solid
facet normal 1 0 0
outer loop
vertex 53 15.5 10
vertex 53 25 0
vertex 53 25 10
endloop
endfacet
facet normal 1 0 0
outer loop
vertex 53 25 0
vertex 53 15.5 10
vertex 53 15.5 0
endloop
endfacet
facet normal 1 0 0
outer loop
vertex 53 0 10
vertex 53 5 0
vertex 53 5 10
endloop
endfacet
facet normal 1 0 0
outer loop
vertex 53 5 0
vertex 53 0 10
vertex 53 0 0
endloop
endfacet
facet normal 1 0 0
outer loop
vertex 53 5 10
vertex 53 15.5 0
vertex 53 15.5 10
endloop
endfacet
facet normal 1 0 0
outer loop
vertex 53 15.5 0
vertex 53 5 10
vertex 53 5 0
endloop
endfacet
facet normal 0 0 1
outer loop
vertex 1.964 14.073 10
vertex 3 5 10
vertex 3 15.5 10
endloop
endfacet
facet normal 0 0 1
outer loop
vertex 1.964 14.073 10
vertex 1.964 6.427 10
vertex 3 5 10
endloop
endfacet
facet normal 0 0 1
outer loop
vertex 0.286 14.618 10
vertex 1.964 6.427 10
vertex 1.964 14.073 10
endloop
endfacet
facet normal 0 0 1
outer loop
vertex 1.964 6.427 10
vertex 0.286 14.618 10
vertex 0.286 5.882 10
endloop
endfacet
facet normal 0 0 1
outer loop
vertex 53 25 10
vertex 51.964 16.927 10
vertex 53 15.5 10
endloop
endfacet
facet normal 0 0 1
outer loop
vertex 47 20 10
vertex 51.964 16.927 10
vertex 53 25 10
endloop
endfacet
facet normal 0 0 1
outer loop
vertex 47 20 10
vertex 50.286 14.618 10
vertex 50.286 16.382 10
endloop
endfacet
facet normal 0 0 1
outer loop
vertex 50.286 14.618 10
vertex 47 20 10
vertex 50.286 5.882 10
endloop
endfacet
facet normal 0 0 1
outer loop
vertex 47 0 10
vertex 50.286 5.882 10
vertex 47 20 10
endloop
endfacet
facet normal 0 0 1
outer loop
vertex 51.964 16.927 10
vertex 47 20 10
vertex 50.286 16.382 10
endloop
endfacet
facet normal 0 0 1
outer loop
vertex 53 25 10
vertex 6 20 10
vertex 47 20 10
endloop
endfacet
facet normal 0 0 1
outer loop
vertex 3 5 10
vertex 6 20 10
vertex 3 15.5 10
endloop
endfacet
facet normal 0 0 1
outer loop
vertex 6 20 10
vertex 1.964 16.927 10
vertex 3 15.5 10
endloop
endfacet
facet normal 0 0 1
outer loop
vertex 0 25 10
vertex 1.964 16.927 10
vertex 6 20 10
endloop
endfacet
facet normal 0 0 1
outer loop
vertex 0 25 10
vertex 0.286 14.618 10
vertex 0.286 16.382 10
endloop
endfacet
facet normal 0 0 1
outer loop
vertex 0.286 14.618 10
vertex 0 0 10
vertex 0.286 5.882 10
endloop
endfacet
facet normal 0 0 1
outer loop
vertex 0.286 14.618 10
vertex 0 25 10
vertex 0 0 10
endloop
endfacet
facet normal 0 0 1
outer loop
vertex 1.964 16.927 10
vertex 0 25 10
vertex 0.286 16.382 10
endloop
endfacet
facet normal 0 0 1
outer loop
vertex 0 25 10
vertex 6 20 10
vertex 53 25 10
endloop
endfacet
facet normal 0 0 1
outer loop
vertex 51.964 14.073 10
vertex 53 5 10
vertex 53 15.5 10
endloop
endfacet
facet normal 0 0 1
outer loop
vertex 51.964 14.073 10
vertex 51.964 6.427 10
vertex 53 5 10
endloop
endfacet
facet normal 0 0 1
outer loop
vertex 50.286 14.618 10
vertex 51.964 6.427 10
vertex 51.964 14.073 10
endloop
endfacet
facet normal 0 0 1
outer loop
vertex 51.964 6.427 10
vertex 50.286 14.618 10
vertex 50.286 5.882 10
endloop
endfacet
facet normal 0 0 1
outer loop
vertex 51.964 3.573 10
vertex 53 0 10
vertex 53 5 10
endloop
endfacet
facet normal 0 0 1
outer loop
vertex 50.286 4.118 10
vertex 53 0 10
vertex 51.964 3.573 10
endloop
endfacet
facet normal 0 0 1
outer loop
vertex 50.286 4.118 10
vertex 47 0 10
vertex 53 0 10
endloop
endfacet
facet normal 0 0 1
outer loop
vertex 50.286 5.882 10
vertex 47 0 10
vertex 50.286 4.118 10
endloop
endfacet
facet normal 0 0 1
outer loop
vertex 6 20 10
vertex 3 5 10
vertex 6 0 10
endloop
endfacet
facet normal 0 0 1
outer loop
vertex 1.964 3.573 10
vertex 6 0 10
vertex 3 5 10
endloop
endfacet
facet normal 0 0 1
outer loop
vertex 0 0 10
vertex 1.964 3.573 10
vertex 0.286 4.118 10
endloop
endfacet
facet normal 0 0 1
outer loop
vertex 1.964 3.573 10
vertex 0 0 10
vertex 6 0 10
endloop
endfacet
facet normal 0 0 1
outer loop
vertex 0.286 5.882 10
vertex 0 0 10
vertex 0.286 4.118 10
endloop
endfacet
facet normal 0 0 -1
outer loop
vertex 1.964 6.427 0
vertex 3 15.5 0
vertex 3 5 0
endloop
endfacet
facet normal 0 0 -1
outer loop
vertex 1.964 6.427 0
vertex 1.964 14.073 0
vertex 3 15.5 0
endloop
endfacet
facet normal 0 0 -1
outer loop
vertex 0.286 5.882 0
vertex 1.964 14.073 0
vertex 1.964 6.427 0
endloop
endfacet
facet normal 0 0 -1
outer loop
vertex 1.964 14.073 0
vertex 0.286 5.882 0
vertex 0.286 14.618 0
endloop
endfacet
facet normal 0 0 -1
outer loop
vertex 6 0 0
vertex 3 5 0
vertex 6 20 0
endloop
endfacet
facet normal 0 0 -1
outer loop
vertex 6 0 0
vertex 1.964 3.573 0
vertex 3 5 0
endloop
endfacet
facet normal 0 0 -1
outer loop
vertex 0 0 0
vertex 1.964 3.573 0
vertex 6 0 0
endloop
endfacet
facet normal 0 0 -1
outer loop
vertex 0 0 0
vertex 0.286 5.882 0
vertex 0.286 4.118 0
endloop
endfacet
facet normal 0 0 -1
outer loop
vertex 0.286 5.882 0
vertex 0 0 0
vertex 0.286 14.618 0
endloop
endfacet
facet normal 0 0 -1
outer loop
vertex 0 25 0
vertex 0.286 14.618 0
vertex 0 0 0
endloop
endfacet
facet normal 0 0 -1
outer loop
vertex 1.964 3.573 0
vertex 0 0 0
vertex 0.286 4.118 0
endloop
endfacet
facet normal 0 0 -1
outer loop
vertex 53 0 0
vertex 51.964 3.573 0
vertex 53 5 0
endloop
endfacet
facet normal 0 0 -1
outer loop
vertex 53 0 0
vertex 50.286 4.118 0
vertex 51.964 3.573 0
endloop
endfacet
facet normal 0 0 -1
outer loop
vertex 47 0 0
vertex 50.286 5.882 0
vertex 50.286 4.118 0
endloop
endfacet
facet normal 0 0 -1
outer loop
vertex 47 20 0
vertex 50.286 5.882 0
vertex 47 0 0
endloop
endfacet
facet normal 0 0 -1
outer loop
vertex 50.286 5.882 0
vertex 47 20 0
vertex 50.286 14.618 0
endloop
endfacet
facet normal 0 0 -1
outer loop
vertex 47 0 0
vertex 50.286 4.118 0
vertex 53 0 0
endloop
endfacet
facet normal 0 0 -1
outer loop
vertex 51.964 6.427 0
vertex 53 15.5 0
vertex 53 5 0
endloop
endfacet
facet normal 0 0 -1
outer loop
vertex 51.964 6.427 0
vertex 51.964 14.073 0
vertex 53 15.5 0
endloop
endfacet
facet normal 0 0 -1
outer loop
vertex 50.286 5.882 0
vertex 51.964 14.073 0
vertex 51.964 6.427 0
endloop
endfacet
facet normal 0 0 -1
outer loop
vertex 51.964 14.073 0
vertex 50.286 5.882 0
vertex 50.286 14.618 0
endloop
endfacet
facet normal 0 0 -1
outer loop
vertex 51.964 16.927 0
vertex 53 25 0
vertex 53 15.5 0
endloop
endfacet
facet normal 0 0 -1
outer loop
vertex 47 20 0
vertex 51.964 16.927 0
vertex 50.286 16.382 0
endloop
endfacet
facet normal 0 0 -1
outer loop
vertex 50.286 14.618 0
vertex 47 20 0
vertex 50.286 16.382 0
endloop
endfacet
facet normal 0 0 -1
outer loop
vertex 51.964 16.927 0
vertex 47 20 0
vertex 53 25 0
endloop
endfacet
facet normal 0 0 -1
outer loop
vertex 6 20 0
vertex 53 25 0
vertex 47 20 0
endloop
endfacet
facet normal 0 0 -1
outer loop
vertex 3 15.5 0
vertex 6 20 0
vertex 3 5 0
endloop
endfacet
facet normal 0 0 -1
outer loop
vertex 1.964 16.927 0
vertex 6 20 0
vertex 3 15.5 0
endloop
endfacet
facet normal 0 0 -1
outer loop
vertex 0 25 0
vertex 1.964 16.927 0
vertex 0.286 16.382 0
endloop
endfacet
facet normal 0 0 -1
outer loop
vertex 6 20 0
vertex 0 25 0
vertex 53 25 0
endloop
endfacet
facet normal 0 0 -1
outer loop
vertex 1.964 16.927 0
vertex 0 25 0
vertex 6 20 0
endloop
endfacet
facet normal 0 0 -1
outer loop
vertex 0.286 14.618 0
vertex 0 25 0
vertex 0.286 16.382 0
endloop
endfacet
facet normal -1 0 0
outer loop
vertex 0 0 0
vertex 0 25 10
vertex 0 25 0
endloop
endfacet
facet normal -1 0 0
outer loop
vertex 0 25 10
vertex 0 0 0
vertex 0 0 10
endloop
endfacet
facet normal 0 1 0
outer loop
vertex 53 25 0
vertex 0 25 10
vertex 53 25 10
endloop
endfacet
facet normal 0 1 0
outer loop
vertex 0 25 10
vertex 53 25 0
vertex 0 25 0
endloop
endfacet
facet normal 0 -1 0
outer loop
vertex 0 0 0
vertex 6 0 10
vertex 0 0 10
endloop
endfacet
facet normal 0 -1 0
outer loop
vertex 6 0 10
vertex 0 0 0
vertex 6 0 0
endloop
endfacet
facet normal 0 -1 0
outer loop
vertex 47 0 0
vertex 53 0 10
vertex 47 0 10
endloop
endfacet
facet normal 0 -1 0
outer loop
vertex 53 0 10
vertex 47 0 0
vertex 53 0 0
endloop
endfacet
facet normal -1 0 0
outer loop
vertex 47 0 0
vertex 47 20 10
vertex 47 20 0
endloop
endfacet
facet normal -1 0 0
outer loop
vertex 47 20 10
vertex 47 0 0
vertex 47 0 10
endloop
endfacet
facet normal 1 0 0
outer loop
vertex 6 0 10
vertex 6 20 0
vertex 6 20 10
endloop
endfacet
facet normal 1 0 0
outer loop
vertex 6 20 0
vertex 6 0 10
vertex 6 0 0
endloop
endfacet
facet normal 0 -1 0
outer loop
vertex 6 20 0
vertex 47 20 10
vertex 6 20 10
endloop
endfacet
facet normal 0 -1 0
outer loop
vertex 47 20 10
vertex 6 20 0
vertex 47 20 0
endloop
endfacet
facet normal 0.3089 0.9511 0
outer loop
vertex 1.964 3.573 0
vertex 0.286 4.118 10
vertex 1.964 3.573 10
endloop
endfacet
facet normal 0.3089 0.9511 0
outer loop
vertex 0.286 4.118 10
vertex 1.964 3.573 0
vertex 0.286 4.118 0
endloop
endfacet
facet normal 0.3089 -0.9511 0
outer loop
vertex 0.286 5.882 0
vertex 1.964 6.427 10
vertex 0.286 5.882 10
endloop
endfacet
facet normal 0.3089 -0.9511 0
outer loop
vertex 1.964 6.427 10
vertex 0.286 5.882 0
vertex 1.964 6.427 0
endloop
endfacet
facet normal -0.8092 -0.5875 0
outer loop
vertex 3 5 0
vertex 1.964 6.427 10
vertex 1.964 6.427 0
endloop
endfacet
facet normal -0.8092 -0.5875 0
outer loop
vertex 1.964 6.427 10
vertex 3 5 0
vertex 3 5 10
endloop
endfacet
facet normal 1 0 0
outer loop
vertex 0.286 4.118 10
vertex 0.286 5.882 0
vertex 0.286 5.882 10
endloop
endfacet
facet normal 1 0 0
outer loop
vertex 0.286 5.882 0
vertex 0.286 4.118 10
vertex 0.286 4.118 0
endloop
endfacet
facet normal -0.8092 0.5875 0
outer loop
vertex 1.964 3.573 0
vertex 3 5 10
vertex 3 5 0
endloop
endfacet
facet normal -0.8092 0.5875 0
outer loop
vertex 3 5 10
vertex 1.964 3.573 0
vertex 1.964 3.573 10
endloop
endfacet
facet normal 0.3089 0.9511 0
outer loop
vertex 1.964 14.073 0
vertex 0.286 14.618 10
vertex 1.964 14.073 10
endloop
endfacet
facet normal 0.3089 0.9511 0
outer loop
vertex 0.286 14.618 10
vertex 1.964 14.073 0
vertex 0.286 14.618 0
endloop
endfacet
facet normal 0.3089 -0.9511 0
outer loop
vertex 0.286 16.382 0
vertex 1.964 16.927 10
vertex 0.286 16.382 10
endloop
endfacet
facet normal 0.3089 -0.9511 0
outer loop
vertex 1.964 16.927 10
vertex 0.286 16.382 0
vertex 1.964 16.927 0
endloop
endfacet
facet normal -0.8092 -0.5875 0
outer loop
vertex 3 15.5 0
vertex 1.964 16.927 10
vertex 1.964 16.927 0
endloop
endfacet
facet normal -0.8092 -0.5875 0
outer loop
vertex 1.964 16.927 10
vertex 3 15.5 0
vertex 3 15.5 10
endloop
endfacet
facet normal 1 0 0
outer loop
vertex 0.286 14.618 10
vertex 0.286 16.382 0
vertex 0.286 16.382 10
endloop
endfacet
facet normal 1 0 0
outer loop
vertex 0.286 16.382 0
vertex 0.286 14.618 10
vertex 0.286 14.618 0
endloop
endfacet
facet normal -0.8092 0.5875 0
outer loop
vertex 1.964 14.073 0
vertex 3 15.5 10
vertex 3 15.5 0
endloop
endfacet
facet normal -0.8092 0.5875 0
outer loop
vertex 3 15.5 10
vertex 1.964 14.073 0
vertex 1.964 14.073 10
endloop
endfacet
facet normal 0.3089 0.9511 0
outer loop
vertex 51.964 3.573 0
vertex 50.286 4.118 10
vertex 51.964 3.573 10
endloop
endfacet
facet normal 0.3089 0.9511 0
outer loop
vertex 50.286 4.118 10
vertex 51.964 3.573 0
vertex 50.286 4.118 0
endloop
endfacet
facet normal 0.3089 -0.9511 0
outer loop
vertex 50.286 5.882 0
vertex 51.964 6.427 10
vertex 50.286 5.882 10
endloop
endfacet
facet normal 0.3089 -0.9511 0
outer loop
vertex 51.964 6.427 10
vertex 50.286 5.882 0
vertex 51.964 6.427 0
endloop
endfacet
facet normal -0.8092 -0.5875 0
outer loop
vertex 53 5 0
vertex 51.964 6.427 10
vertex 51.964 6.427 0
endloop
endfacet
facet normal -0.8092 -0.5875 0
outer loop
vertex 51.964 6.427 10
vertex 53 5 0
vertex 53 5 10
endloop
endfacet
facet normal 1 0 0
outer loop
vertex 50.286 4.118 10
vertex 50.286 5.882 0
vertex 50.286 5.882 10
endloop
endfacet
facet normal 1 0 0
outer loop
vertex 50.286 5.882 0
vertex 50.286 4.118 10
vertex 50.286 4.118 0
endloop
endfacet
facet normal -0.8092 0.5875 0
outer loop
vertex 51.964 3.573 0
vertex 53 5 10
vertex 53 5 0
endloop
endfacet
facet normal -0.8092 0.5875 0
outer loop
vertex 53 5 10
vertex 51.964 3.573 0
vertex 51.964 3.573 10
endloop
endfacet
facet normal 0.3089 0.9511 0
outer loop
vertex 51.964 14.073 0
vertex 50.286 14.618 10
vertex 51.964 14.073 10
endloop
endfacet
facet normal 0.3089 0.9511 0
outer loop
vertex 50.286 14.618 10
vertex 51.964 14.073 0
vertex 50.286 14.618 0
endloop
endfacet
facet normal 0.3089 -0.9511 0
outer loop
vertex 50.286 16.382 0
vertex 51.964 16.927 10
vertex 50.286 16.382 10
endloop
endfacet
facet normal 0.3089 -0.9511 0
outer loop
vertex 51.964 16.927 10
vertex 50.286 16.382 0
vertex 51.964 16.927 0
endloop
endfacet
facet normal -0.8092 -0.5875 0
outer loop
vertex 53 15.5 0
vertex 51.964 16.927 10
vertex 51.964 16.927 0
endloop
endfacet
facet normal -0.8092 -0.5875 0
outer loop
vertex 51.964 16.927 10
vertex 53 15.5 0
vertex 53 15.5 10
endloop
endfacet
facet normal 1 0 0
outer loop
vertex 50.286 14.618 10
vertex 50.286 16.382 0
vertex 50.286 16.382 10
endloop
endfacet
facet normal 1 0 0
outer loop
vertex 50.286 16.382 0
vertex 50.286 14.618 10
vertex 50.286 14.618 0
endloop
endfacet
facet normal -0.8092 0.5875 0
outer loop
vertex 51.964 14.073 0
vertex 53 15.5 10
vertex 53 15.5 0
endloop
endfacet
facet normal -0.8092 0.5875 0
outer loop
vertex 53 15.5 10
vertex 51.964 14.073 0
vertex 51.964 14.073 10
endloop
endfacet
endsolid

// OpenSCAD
difference(){
    cube([53, 25, 10], center = 0);
    translate([6, 0, 0])
    cube([41, 20, 10], center = 0);
    
    translate([1.5, 5, 0])
    cylinder(11, r=1.5, center=0);

    translate([1.5, 15.5, 0])
    cylinder(11, r=1.5, center=0);

    translate([51.5, 5, 0])
    cylinder(11, r=1.5, center=0);

    translate([51.5, 15.5, 0])
    cylinder(11, r=1.5, center=0);
}
